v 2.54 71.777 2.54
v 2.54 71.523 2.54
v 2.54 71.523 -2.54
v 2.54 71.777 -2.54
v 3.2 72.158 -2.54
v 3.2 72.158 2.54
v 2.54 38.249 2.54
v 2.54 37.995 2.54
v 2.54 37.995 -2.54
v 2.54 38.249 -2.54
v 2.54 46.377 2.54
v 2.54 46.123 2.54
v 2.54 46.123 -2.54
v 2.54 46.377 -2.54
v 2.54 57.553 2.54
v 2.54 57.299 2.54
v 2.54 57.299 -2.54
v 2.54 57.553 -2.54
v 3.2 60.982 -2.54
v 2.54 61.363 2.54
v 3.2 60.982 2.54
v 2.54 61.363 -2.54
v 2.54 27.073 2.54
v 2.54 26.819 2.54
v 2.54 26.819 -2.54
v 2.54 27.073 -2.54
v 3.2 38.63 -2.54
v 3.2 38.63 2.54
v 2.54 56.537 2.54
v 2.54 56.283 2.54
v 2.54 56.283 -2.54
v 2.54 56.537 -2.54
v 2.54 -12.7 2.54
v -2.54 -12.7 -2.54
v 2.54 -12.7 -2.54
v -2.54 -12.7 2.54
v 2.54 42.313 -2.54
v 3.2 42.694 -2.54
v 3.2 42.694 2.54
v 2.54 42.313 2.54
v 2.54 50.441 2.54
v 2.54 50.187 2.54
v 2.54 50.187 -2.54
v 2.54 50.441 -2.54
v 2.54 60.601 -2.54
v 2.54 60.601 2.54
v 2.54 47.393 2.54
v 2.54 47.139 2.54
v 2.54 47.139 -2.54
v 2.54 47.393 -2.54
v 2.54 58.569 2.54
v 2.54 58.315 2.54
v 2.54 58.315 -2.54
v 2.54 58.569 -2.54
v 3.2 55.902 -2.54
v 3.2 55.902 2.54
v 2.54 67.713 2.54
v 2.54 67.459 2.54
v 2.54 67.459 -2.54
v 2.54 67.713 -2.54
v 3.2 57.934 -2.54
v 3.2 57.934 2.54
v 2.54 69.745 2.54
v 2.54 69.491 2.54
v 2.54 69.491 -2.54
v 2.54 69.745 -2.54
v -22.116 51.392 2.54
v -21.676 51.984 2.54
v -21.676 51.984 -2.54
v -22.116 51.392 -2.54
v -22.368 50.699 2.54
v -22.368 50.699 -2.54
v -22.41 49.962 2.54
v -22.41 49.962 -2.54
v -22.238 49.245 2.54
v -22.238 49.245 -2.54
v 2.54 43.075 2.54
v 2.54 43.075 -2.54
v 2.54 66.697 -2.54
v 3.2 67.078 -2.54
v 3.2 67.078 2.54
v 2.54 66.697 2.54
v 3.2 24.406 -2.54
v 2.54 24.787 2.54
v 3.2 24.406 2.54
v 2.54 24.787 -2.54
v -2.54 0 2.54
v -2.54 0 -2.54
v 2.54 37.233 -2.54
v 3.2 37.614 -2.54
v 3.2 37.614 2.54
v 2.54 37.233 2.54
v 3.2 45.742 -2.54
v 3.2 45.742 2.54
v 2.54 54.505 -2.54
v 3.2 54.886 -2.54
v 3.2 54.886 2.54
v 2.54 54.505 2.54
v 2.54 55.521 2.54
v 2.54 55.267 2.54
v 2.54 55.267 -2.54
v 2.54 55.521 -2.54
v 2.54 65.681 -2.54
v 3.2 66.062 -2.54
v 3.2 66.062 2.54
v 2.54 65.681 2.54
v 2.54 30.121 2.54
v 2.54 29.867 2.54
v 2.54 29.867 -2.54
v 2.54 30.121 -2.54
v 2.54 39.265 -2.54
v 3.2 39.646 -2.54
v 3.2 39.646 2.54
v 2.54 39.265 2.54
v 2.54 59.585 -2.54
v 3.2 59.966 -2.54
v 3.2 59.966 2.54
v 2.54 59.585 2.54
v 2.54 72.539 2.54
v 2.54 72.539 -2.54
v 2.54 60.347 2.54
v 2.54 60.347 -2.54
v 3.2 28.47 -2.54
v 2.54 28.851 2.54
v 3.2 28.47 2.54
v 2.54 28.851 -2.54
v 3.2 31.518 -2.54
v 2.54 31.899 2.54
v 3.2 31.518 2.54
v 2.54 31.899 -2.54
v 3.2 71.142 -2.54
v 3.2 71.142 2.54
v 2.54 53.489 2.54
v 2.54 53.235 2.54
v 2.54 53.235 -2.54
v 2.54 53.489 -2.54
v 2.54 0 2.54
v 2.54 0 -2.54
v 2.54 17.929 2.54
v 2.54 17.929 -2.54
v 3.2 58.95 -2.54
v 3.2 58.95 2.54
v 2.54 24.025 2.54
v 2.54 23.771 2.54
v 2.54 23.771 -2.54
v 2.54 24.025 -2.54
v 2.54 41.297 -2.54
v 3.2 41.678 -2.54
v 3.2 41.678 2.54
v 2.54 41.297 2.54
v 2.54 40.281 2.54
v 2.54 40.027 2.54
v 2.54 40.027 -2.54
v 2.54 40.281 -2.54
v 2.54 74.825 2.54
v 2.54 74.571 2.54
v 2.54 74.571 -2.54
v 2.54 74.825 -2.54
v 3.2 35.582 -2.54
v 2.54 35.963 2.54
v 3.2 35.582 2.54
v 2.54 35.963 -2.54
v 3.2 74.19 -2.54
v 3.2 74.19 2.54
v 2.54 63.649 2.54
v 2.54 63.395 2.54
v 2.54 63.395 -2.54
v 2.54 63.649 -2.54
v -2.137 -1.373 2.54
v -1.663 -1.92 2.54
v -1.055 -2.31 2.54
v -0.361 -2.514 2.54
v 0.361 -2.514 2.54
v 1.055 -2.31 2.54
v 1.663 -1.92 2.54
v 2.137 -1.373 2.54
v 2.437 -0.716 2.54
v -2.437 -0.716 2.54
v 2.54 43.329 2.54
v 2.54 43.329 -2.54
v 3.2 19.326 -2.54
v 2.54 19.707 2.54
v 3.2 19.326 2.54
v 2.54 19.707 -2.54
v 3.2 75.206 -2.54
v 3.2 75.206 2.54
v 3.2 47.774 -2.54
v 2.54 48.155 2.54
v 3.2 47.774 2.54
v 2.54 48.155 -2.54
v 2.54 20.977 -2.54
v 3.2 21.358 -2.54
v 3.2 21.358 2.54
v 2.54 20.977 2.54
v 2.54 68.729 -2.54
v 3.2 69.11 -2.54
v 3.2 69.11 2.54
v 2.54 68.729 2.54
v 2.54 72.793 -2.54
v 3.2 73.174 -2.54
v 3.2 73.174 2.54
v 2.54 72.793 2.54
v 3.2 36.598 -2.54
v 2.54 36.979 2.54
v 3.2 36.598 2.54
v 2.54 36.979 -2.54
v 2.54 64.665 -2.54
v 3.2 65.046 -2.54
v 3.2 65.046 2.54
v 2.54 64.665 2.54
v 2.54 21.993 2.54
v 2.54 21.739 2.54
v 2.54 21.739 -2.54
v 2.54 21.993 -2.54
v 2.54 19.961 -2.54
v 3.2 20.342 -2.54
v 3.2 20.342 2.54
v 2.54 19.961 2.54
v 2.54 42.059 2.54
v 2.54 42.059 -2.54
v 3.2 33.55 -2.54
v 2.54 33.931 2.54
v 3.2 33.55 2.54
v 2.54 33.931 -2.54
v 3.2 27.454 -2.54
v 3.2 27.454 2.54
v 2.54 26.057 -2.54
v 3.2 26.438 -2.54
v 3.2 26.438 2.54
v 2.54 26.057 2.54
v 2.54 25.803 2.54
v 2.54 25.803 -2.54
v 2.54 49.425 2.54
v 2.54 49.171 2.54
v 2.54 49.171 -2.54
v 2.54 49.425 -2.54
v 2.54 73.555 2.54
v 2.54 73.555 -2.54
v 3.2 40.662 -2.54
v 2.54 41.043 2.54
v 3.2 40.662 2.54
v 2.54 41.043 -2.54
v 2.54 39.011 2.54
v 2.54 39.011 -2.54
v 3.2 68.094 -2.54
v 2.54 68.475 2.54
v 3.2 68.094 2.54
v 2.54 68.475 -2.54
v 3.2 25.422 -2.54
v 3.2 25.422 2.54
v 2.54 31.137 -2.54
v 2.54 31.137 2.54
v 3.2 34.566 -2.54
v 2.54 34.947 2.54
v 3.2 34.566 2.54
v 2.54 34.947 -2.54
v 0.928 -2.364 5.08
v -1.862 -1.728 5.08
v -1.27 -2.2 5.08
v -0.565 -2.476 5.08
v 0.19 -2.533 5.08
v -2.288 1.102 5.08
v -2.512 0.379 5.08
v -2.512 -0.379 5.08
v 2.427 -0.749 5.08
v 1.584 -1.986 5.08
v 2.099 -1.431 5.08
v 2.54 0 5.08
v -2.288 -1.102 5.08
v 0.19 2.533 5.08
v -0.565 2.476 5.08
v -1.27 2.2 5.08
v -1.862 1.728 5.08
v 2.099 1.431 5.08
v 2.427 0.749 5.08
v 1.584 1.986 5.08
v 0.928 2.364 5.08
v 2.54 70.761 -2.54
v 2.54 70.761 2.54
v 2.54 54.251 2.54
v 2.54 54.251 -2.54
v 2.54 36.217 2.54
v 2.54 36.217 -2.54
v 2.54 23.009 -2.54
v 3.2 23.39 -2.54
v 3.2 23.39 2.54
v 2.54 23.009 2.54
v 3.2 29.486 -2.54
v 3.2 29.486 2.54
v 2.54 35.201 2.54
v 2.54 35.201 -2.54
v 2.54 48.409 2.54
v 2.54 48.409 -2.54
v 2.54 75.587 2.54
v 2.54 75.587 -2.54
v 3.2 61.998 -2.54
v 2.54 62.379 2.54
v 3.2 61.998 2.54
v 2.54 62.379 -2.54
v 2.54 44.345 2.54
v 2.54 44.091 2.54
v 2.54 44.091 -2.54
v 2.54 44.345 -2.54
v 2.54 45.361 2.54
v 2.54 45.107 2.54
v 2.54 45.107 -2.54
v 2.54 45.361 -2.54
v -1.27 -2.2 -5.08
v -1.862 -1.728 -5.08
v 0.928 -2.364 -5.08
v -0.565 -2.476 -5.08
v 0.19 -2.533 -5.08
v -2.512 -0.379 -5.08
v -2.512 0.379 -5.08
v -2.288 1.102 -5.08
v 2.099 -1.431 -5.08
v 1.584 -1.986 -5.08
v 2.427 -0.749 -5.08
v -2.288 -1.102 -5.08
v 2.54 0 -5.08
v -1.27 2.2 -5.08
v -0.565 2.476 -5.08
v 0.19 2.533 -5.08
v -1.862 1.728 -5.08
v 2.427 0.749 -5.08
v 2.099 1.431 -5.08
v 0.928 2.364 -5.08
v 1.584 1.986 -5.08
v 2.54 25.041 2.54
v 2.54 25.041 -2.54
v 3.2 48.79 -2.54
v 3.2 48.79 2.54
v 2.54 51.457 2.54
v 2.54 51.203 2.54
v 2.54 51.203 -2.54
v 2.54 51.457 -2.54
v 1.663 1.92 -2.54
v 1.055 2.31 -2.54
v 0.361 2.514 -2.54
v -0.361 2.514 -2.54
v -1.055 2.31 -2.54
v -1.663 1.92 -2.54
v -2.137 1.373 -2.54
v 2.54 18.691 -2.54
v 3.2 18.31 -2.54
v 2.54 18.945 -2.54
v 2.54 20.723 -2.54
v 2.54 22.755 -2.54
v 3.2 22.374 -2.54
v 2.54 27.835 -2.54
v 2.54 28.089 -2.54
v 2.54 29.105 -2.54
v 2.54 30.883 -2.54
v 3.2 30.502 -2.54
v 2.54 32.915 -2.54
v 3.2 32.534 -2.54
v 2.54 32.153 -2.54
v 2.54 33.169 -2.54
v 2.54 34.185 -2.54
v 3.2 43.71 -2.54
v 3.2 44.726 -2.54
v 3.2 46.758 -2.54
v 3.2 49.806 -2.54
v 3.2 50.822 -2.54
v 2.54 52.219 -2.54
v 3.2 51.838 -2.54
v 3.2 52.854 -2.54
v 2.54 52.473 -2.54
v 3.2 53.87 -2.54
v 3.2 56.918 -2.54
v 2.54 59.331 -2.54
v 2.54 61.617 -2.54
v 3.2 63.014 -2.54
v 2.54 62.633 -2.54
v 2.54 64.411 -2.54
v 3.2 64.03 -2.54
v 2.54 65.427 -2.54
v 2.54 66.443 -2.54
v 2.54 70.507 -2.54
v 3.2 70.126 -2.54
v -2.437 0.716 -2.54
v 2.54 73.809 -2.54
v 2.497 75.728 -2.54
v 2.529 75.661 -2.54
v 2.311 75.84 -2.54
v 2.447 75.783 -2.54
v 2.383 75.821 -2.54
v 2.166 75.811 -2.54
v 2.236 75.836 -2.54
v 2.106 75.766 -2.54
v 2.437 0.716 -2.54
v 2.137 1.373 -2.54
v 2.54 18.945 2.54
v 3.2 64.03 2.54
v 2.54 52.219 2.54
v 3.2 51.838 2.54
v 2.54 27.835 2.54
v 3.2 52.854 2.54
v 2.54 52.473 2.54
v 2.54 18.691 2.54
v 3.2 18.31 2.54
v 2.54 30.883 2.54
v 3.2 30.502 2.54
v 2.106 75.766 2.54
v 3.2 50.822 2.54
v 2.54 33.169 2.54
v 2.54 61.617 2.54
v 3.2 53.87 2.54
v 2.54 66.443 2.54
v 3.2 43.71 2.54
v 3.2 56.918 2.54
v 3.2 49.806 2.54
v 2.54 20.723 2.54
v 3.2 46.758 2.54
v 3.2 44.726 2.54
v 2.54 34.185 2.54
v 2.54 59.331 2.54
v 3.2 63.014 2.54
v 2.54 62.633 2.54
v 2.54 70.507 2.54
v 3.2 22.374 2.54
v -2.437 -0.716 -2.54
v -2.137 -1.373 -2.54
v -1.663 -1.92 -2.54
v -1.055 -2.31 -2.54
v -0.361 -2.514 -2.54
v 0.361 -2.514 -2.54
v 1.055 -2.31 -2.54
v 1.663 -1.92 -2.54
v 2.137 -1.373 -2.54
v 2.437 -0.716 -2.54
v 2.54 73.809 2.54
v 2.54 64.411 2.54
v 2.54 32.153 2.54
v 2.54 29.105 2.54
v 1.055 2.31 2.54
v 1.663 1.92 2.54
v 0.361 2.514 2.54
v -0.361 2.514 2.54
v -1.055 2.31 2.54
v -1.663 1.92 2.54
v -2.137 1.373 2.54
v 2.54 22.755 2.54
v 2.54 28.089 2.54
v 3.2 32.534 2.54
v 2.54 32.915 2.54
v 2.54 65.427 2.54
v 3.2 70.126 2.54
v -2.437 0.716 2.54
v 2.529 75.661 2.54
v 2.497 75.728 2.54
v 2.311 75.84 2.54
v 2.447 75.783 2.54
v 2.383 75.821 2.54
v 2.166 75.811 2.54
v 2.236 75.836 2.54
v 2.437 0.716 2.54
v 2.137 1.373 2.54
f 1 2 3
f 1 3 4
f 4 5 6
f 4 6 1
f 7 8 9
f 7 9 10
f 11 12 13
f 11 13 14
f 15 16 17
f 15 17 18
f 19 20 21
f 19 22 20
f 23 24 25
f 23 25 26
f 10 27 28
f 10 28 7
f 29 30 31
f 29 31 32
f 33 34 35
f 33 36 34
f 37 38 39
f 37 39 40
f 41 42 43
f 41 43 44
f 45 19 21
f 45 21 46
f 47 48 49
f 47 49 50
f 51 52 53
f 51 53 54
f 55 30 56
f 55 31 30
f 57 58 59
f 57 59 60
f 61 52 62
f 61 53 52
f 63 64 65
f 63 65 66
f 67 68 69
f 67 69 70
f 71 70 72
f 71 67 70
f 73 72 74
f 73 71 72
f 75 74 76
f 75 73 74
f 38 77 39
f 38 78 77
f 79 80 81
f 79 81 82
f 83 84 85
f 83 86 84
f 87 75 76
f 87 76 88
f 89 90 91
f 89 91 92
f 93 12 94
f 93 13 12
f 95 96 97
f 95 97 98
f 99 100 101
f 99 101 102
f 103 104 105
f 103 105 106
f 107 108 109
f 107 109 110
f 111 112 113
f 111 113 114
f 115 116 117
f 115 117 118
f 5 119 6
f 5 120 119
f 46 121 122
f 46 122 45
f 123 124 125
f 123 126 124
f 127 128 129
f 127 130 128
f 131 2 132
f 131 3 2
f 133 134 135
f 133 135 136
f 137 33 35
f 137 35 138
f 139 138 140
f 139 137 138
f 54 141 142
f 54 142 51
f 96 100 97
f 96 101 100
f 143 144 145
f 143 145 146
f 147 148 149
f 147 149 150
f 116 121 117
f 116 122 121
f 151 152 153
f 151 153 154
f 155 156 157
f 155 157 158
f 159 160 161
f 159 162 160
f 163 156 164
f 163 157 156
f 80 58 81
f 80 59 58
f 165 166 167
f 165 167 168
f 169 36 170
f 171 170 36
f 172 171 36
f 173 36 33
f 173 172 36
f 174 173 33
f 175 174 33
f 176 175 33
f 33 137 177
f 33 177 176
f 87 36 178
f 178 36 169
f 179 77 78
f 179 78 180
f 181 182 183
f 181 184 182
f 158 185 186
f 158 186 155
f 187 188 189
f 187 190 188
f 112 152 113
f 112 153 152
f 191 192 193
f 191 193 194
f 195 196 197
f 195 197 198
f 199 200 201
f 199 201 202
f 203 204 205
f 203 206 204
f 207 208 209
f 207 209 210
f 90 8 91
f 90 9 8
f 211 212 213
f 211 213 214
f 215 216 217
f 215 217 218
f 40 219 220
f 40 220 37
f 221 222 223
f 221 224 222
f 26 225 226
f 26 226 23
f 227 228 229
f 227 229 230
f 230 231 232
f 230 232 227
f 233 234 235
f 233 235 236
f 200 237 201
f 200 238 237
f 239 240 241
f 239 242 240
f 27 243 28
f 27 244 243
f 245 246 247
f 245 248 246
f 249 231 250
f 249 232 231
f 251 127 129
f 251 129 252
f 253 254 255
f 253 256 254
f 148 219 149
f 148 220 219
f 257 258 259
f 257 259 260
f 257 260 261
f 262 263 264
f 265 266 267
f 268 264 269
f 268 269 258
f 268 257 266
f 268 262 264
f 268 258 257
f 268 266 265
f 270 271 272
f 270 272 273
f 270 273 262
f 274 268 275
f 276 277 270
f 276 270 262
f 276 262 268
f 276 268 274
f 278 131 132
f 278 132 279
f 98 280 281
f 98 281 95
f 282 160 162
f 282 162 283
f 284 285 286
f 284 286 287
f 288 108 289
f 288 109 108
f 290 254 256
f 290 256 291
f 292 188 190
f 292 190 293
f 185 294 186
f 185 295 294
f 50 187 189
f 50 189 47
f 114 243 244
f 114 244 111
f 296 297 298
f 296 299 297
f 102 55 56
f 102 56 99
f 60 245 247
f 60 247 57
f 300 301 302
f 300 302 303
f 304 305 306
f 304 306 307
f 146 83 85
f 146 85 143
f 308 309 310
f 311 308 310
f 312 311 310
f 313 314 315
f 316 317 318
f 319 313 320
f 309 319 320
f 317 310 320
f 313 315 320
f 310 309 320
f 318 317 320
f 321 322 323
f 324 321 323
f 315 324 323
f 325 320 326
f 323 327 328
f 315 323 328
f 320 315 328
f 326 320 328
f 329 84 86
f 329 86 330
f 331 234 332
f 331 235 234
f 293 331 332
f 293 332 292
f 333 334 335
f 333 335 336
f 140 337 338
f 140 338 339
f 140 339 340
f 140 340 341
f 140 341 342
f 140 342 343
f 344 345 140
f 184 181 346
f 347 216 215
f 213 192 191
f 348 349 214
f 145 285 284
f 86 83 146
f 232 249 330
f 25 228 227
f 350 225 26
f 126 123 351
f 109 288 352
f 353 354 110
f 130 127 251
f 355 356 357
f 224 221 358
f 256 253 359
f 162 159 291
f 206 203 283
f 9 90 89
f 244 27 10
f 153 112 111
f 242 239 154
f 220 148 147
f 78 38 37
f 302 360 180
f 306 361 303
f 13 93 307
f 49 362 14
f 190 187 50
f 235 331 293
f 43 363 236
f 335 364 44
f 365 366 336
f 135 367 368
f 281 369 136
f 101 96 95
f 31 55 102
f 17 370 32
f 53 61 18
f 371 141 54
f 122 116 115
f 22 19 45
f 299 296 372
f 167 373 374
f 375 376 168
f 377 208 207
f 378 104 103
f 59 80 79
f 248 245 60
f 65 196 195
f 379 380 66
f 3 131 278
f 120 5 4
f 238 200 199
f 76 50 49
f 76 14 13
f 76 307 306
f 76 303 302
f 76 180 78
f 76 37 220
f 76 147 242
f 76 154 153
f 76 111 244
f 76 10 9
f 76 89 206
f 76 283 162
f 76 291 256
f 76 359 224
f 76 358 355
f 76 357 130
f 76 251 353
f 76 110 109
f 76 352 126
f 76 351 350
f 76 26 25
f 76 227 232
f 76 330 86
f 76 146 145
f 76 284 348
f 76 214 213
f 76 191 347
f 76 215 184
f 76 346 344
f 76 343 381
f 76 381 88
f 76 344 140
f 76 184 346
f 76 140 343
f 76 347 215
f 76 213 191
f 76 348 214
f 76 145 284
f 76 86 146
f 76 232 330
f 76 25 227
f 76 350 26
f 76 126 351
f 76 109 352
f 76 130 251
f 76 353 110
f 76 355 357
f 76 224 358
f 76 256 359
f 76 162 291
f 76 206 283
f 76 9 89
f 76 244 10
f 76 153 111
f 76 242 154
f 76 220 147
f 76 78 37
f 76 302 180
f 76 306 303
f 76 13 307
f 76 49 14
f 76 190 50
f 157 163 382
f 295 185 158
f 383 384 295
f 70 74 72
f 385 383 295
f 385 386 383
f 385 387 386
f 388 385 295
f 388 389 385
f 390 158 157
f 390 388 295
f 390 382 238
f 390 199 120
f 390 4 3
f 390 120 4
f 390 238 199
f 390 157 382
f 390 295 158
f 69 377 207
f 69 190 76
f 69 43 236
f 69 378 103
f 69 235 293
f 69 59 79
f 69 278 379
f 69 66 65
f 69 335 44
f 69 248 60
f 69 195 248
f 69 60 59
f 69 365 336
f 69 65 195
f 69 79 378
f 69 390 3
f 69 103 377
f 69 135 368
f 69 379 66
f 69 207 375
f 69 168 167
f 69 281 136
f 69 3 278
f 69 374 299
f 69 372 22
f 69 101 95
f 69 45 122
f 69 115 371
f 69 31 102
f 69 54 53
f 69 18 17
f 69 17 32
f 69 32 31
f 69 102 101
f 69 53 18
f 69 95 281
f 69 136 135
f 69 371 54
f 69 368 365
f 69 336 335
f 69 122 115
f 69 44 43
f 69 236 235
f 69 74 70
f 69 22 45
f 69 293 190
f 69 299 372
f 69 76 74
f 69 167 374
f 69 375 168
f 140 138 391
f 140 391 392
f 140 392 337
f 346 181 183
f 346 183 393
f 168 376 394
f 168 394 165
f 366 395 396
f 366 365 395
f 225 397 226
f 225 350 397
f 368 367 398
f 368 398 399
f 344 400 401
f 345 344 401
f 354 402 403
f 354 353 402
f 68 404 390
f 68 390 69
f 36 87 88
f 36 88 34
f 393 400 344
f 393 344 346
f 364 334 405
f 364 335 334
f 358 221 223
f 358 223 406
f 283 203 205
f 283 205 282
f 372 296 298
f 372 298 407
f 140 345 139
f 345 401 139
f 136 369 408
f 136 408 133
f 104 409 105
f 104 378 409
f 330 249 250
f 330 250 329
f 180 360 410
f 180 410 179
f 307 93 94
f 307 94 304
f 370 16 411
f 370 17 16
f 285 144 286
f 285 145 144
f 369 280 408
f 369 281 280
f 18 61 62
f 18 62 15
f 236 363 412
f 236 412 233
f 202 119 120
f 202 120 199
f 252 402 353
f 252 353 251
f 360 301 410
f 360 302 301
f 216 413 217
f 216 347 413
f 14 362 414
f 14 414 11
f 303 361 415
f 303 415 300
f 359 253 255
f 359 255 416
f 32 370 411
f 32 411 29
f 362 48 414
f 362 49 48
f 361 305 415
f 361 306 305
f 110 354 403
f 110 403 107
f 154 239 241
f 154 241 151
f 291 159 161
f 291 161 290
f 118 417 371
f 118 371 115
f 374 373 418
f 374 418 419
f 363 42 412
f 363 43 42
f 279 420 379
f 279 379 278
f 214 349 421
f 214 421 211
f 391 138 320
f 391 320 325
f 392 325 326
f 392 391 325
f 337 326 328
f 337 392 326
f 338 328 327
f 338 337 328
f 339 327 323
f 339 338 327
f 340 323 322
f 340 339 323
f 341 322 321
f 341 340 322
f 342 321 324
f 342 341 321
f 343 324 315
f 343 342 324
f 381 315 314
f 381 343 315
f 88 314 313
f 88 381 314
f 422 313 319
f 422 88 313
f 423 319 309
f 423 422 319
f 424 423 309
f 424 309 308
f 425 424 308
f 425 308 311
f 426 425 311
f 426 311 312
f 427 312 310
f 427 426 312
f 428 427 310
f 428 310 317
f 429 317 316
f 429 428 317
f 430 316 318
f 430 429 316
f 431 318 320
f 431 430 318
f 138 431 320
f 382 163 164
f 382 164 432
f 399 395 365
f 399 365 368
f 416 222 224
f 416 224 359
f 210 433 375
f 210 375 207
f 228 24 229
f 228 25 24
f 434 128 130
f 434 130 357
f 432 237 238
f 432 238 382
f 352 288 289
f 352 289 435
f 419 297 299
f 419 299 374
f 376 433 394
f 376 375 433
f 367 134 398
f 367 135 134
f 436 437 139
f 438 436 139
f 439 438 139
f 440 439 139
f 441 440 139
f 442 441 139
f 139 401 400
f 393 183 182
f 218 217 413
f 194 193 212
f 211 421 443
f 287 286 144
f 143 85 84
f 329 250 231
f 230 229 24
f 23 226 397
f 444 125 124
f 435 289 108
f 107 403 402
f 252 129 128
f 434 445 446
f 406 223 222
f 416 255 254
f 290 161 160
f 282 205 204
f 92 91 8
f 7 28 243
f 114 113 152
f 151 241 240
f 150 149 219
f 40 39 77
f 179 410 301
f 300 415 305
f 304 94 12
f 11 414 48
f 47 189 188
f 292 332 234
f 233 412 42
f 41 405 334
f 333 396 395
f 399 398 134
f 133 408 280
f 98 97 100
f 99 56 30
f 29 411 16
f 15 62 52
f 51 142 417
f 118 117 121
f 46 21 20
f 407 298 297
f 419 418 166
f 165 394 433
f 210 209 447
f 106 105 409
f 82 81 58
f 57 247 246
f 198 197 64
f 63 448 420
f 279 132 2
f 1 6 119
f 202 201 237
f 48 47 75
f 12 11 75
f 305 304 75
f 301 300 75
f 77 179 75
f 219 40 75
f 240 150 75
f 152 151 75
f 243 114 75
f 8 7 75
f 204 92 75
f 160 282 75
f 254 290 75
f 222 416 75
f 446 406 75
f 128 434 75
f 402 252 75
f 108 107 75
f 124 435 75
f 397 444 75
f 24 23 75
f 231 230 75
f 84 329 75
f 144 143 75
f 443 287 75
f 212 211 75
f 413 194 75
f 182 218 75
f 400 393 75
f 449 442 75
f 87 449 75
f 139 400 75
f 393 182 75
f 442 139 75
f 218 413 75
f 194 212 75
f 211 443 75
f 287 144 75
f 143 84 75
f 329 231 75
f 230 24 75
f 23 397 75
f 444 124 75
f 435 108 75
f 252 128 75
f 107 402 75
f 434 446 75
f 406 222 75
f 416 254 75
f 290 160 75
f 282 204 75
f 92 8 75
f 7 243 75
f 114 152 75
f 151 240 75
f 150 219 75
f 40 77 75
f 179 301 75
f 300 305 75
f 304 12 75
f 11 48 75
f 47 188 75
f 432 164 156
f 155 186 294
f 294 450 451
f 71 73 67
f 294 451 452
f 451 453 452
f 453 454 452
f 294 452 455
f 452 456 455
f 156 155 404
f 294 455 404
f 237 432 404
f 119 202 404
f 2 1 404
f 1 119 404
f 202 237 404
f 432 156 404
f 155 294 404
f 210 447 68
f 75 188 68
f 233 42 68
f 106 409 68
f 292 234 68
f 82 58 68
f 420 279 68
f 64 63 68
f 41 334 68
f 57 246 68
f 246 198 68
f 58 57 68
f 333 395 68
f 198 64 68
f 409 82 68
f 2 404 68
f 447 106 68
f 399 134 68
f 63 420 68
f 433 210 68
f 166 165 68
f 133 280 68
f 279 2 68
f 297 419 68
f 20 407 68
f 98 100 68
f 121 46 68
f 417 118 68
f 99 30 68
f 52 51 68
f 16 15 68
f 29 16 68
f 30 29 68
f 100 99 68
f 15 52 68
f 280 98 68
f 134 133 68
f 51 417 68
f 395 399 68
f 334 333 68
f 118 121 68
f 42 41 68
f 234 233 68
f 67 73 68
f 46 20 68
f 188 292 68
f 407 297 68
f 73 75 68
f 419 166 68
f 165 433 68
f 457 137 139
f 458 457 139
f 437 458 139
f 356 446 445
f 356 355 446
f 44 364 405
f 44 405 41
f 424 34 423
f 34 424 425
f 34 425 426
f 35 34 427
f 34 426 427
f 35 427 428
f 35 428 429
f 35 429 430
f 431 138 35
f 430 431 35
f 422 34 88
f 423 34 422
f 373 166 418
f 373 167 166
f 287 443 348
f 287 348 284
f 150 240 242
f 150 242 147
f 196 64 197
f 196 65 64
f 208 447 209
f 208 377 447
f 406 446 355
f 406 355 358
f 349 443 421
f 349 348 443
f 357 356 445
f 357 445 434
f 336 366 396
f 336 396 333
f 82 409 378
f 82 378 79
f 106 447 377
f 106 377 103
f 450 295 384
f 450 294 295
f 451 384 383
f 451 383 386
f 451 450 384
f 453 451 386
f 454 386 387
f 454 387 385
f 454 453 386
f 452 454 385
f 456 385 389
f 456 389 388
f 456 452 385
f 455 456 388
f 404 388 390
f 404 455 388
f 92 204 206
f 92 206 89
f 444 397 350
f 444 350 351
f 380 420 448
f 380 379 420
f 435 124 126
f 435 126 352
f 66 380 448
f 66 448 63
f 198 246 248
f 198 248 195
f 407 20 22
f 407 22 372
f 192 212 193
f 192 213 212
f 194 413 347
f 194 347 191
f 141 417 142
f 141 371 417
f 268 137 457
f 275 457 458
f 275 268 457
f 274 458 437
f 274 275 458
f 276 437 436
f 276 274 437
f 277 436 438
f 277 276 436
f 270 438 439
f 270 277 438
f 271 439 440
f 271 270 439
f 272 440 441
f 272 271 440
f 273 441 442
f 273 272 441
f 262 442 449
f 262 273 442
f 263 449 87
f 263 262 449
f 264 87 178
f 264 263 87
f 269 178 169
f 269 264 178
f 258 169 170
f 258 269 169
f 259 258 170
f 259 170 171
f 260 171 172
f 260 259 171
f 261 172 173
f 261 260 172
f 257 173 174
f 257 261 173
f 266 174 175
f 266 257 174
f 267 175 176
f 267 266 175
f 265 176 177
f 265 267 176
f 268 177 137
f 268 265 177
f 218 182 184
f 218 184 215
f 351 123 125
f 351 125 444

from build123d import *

# Parameters (mm, degrees)
SKETCH1_R           = 2.54
BOSS_EXTRUDE1_DEPTH = 5.08
BOSS_EXTRUDE2_DEPTH = 2.54
BOSS_EXTRUDE3_DEPTH = 2.54


with BuildPart() as part:
    # Sketch1 → Boss-Extrude1 (new, symmetric)
    with BuildSketch(Plane.XY):
        Circle(SKETCH1_R)
    extrude(amount=BOSS_EXTRUDE1_DEPTH, both=True)

    # Sketch2 → Boss-Extrude2 (add, symmetric)
    with BuildSketch(Plane.XY):
        with BuildLine():
            Line((2.54, 0), (2.54, 75.586789755))
            ThreePointArc((2.54, 75.586789755), (2.383201592, 75.821455156), (2.106394878, 75.766394878))
            Line((2.106394878, 75.766394878), (-21.675690723, 51.984309277))
            ThreePointArc((-21.675690723, 51.984309277), (-22.367766915, 50.698965368), (-22.237970294, 49.244925735))
            Line((-22.237970294, 49.244925735), (-2.54, 0))
            Line((-2.54, 0), (-2.54, -12.7))
            Line((-2.54, -12.7), (2.54, -12.7))
            Line((2.54, -12.7), (2.54, 0))
        make_face()
    extrude(amount=BOSS_EXTRUDE2_DEPTH, both=True)

    # Sketch3 → Boss-Extrude3 (add, symmetric)
    with BuildSketch(Plane.XY):
        Polygon((2.54, 75.586789755), (3.199911358, 75.205789755), (2.54, 74.824789755), align=None)
        Polygon((2.54, 74.570789755), (3.199911358, 74.189789755), (2.54, 73.808789755), align=None)
        Polygon((2.54, 73.554789755), (3.199911358, 73.173789755), (2.54, 72.792789755), align=None)
        Polygon((2.54, 72.538789755), (3.199911358, 72.157789755), (2.54, 71.776789755), align=None)
        Polygon((2.54, 71.522789755), (3.199911358, 71.141789755), (2.54, 70.760789755), align=None)
        Polygon((2.54, 70.506789755), (3.199911358, 70.125789755), (2.54, 69.744789755), align=None)
        Polygon((2.54, 69.490789755), (3.199911358, 69.109789755), (2.54, 68.728789755), align=None)
        Polygon((2.54, 68.474789755), (3.199911358, 68.093789755), (2.54, 67.712789755), align=None)
        Polygon((2.54, 67.458789755), (3.199911358, 67.077789755), (2.54, 66.696789755), align=None)
        Polygon((2.54, 66.442789755), (3.199911358, 66.061789755), (2.54, 65.680789755), align=None)
        Polygon((2.54, 65.426789755), (3.199911358, 65.045789755), (2.54, 64.664789755), align=None)
        Polygon((2.54, 64.410789755), (3.199911358, 64.029789755), (2.54, 63.648789755), align=None)
        Polygon((2.54, 63.394789755), (3.199911358, 63.013789755), (2.54, 62.632789755), align=None)
        Polygon((2.54, 62.378789755), (3.199911358, 61.997789755), (2.54, 61.616789755), align=None)
        Polygon((2.54, 61.362789755), (3.199911358, 60.981789755), (2.54, 60.600789755), align=None)
        Polygon((2.54, 60.346789755), (3.199911358, 59.965789755), (2.54, 59.584789755), align=None)
        Polygon((2.54, 59.330789755), (3.199911358, 58.949789755), (2.54, 58.568789755), align=None)
        Polygon((2.54, 58.314789755), (3.199911358, 57.933789755), (2.54, 57.552789755), align=None)
        Polygon((2.54, 57.298789755), (3.199911358, 56.917789755), (2.54, 56.536789755), align=None)
        Polygon((2.54, 56.282789755), (3.199911358, 55.901789755), (2.54, 55.520789755), align=None)
        Polygon((2.54, 55.266789755), (3.199911358, 54.885789755), (2.54, 54.504789755), align=None)
        Polygon((2.54, 54.250789755), (3.199911358, 53.869789755), (2.54, 53.488789755), align=None)
        Polygon((2.54, 53.234789755), (3.199911358, 52.853789755), (2.54, 52.472789755), align=None)
        Polygon((2.54, 52.218789755), (3.199911358, 51.837789755), (2.54, 51.456789755), align=None)
        Polygon((2.54, 51.202789755), (3.199911358, 50.821789755), (2.54, 50.440789755), align=None)
        Polygon((2.54, 50.186789755), (3.199911358, 49.805789755), (2.54, 49.424789755), align=None)
        Polygon((2.54, 49.170789755), (3.199911358, 48.789789755), (2.54, 48.408789755), align=None)
        Polygon((2.54, 48.154789755), (3.199911358, 47.773789755), (2.54, 47.392789755), align=None)
        Polygon((2.54, 47.138789755), (3.199911358, 46.757789755), (2.54, 46.376789755), align=None)
        Polygon((2.54, 46.122789755), (3.199911358, 45.741789755), (2.54, 45.360789755), align=None)
        Polygon((2.54, 45.106789755), (3.199911358, 44.725789755), (2.54, 44.344789755), align=None)
        Polygon((2.54, 44.090789755), (3.199911358, 43.709789755), (2.54, 43.328789755), align=None)
        Polygon((2.54, 43.074789755), (3.199911358, 42.693789755), (2.54, 42.312789755), align=None)
        Polygon((2.54, 42.058789755), (3.199911358, 41.677789755), (2.54, 41.296789755), align=None)
        Polygon((2.54, 41.042789755), (3.199911358, 40.661789755), (2.54, 40.280789755), align=None)
        Polygon((2.54, 40.026789755), (3.199911358, 39.645789755), (2.54, 39.264789755), align=None)
        Polygon((2.54, 39.010789755), (3.199911358, 38.629789755), (2.54, 38.248789755), align=None)
        Polygon((2.54, 37.994789755), (3.199911358, 37.613789755), (2.54, 37.232789755), align=None)
        Polygon((2.54, 36.978789755), (3.199911358, 36.597789755), (2.54, 36.216789755), align=None)
        Polygon((2.54, 35.962789755), (3.199911358, 35.581789755), (2.54, 35.200789755), align=None)
        Polygon((2.54, 34.946789755), (3.199911358, 34.565789755), (2.54, 34.184789755), align=None)
        Polygon((2.54, 33.930789755), (3.199911358, 33.549789755), (2.54, 33.168789755), align=None)
        Polygon((2.54, 32.914789755), (3.199911358, 32.533789755), (2.54, 32.152789755), align=None)
        Polygon((2.54, 31.898789755), (3.199911358, 31.517789755), (2.54, 31.136789755), align=None)
        Polygon((2.54, 30.882789755), (3.199911358, 30.501789755), (2.54, 30.120789755), align=None)
        Polygon((2.54, 29.866789755), (3.199911358, 29.485789755), (2.54, 29.104789755), align=None)
        Polygon((2.54, 28.850789755), (3.199911358, 28.469789755), (2.54, 28.088789755), align=None)
        Polygon((2.54, 27.834789755), (3.199911358, 27.453789755), (2.54, 27.072789755), align=None)
        Polygon((2.54, 26.818789755), (3.199911358, 26.437789755), (2.54, 26.056789755), align=None)
        Polygon((2.54, 25.802789755), (3.199911358, 25.421789755), (2.54, 25.040789755), align=None)
        Polygon((2.54, 24.786789755), (3.199911358, 24.405789755), (2.54, 24.024789755), align=None)
        Polygon((2.54, 23.770789755), (3.199911358, 23.389789755), (2.54, 23.008789755), align=None)
        Polygon((2.54, 22.754789755), (3.199911358, 22.373789755), (2.54, 21.992789755), align=None)
        Polygon((2.54, 21.738789755), (3.199911358, 21.357789755), (2.54, 20.976789755), align=None)
        Polygon((2.54, 20.722789755), (3.199911358, 20.341789755), (2.54, 19.960789755), align=None)
        Polygon((2.54, 19.706789755), (3.199911358, 19.325789755), (2.54, 18.944789755), align=None)
        Polygon((2.54, 18.690789755), (3.199911358, 18.309789755), (2.54, 17.928789755), align=None)
    extrude(amount=BOSS_EXTRUDE3_DEPTH, both=True)


solid = part.part
